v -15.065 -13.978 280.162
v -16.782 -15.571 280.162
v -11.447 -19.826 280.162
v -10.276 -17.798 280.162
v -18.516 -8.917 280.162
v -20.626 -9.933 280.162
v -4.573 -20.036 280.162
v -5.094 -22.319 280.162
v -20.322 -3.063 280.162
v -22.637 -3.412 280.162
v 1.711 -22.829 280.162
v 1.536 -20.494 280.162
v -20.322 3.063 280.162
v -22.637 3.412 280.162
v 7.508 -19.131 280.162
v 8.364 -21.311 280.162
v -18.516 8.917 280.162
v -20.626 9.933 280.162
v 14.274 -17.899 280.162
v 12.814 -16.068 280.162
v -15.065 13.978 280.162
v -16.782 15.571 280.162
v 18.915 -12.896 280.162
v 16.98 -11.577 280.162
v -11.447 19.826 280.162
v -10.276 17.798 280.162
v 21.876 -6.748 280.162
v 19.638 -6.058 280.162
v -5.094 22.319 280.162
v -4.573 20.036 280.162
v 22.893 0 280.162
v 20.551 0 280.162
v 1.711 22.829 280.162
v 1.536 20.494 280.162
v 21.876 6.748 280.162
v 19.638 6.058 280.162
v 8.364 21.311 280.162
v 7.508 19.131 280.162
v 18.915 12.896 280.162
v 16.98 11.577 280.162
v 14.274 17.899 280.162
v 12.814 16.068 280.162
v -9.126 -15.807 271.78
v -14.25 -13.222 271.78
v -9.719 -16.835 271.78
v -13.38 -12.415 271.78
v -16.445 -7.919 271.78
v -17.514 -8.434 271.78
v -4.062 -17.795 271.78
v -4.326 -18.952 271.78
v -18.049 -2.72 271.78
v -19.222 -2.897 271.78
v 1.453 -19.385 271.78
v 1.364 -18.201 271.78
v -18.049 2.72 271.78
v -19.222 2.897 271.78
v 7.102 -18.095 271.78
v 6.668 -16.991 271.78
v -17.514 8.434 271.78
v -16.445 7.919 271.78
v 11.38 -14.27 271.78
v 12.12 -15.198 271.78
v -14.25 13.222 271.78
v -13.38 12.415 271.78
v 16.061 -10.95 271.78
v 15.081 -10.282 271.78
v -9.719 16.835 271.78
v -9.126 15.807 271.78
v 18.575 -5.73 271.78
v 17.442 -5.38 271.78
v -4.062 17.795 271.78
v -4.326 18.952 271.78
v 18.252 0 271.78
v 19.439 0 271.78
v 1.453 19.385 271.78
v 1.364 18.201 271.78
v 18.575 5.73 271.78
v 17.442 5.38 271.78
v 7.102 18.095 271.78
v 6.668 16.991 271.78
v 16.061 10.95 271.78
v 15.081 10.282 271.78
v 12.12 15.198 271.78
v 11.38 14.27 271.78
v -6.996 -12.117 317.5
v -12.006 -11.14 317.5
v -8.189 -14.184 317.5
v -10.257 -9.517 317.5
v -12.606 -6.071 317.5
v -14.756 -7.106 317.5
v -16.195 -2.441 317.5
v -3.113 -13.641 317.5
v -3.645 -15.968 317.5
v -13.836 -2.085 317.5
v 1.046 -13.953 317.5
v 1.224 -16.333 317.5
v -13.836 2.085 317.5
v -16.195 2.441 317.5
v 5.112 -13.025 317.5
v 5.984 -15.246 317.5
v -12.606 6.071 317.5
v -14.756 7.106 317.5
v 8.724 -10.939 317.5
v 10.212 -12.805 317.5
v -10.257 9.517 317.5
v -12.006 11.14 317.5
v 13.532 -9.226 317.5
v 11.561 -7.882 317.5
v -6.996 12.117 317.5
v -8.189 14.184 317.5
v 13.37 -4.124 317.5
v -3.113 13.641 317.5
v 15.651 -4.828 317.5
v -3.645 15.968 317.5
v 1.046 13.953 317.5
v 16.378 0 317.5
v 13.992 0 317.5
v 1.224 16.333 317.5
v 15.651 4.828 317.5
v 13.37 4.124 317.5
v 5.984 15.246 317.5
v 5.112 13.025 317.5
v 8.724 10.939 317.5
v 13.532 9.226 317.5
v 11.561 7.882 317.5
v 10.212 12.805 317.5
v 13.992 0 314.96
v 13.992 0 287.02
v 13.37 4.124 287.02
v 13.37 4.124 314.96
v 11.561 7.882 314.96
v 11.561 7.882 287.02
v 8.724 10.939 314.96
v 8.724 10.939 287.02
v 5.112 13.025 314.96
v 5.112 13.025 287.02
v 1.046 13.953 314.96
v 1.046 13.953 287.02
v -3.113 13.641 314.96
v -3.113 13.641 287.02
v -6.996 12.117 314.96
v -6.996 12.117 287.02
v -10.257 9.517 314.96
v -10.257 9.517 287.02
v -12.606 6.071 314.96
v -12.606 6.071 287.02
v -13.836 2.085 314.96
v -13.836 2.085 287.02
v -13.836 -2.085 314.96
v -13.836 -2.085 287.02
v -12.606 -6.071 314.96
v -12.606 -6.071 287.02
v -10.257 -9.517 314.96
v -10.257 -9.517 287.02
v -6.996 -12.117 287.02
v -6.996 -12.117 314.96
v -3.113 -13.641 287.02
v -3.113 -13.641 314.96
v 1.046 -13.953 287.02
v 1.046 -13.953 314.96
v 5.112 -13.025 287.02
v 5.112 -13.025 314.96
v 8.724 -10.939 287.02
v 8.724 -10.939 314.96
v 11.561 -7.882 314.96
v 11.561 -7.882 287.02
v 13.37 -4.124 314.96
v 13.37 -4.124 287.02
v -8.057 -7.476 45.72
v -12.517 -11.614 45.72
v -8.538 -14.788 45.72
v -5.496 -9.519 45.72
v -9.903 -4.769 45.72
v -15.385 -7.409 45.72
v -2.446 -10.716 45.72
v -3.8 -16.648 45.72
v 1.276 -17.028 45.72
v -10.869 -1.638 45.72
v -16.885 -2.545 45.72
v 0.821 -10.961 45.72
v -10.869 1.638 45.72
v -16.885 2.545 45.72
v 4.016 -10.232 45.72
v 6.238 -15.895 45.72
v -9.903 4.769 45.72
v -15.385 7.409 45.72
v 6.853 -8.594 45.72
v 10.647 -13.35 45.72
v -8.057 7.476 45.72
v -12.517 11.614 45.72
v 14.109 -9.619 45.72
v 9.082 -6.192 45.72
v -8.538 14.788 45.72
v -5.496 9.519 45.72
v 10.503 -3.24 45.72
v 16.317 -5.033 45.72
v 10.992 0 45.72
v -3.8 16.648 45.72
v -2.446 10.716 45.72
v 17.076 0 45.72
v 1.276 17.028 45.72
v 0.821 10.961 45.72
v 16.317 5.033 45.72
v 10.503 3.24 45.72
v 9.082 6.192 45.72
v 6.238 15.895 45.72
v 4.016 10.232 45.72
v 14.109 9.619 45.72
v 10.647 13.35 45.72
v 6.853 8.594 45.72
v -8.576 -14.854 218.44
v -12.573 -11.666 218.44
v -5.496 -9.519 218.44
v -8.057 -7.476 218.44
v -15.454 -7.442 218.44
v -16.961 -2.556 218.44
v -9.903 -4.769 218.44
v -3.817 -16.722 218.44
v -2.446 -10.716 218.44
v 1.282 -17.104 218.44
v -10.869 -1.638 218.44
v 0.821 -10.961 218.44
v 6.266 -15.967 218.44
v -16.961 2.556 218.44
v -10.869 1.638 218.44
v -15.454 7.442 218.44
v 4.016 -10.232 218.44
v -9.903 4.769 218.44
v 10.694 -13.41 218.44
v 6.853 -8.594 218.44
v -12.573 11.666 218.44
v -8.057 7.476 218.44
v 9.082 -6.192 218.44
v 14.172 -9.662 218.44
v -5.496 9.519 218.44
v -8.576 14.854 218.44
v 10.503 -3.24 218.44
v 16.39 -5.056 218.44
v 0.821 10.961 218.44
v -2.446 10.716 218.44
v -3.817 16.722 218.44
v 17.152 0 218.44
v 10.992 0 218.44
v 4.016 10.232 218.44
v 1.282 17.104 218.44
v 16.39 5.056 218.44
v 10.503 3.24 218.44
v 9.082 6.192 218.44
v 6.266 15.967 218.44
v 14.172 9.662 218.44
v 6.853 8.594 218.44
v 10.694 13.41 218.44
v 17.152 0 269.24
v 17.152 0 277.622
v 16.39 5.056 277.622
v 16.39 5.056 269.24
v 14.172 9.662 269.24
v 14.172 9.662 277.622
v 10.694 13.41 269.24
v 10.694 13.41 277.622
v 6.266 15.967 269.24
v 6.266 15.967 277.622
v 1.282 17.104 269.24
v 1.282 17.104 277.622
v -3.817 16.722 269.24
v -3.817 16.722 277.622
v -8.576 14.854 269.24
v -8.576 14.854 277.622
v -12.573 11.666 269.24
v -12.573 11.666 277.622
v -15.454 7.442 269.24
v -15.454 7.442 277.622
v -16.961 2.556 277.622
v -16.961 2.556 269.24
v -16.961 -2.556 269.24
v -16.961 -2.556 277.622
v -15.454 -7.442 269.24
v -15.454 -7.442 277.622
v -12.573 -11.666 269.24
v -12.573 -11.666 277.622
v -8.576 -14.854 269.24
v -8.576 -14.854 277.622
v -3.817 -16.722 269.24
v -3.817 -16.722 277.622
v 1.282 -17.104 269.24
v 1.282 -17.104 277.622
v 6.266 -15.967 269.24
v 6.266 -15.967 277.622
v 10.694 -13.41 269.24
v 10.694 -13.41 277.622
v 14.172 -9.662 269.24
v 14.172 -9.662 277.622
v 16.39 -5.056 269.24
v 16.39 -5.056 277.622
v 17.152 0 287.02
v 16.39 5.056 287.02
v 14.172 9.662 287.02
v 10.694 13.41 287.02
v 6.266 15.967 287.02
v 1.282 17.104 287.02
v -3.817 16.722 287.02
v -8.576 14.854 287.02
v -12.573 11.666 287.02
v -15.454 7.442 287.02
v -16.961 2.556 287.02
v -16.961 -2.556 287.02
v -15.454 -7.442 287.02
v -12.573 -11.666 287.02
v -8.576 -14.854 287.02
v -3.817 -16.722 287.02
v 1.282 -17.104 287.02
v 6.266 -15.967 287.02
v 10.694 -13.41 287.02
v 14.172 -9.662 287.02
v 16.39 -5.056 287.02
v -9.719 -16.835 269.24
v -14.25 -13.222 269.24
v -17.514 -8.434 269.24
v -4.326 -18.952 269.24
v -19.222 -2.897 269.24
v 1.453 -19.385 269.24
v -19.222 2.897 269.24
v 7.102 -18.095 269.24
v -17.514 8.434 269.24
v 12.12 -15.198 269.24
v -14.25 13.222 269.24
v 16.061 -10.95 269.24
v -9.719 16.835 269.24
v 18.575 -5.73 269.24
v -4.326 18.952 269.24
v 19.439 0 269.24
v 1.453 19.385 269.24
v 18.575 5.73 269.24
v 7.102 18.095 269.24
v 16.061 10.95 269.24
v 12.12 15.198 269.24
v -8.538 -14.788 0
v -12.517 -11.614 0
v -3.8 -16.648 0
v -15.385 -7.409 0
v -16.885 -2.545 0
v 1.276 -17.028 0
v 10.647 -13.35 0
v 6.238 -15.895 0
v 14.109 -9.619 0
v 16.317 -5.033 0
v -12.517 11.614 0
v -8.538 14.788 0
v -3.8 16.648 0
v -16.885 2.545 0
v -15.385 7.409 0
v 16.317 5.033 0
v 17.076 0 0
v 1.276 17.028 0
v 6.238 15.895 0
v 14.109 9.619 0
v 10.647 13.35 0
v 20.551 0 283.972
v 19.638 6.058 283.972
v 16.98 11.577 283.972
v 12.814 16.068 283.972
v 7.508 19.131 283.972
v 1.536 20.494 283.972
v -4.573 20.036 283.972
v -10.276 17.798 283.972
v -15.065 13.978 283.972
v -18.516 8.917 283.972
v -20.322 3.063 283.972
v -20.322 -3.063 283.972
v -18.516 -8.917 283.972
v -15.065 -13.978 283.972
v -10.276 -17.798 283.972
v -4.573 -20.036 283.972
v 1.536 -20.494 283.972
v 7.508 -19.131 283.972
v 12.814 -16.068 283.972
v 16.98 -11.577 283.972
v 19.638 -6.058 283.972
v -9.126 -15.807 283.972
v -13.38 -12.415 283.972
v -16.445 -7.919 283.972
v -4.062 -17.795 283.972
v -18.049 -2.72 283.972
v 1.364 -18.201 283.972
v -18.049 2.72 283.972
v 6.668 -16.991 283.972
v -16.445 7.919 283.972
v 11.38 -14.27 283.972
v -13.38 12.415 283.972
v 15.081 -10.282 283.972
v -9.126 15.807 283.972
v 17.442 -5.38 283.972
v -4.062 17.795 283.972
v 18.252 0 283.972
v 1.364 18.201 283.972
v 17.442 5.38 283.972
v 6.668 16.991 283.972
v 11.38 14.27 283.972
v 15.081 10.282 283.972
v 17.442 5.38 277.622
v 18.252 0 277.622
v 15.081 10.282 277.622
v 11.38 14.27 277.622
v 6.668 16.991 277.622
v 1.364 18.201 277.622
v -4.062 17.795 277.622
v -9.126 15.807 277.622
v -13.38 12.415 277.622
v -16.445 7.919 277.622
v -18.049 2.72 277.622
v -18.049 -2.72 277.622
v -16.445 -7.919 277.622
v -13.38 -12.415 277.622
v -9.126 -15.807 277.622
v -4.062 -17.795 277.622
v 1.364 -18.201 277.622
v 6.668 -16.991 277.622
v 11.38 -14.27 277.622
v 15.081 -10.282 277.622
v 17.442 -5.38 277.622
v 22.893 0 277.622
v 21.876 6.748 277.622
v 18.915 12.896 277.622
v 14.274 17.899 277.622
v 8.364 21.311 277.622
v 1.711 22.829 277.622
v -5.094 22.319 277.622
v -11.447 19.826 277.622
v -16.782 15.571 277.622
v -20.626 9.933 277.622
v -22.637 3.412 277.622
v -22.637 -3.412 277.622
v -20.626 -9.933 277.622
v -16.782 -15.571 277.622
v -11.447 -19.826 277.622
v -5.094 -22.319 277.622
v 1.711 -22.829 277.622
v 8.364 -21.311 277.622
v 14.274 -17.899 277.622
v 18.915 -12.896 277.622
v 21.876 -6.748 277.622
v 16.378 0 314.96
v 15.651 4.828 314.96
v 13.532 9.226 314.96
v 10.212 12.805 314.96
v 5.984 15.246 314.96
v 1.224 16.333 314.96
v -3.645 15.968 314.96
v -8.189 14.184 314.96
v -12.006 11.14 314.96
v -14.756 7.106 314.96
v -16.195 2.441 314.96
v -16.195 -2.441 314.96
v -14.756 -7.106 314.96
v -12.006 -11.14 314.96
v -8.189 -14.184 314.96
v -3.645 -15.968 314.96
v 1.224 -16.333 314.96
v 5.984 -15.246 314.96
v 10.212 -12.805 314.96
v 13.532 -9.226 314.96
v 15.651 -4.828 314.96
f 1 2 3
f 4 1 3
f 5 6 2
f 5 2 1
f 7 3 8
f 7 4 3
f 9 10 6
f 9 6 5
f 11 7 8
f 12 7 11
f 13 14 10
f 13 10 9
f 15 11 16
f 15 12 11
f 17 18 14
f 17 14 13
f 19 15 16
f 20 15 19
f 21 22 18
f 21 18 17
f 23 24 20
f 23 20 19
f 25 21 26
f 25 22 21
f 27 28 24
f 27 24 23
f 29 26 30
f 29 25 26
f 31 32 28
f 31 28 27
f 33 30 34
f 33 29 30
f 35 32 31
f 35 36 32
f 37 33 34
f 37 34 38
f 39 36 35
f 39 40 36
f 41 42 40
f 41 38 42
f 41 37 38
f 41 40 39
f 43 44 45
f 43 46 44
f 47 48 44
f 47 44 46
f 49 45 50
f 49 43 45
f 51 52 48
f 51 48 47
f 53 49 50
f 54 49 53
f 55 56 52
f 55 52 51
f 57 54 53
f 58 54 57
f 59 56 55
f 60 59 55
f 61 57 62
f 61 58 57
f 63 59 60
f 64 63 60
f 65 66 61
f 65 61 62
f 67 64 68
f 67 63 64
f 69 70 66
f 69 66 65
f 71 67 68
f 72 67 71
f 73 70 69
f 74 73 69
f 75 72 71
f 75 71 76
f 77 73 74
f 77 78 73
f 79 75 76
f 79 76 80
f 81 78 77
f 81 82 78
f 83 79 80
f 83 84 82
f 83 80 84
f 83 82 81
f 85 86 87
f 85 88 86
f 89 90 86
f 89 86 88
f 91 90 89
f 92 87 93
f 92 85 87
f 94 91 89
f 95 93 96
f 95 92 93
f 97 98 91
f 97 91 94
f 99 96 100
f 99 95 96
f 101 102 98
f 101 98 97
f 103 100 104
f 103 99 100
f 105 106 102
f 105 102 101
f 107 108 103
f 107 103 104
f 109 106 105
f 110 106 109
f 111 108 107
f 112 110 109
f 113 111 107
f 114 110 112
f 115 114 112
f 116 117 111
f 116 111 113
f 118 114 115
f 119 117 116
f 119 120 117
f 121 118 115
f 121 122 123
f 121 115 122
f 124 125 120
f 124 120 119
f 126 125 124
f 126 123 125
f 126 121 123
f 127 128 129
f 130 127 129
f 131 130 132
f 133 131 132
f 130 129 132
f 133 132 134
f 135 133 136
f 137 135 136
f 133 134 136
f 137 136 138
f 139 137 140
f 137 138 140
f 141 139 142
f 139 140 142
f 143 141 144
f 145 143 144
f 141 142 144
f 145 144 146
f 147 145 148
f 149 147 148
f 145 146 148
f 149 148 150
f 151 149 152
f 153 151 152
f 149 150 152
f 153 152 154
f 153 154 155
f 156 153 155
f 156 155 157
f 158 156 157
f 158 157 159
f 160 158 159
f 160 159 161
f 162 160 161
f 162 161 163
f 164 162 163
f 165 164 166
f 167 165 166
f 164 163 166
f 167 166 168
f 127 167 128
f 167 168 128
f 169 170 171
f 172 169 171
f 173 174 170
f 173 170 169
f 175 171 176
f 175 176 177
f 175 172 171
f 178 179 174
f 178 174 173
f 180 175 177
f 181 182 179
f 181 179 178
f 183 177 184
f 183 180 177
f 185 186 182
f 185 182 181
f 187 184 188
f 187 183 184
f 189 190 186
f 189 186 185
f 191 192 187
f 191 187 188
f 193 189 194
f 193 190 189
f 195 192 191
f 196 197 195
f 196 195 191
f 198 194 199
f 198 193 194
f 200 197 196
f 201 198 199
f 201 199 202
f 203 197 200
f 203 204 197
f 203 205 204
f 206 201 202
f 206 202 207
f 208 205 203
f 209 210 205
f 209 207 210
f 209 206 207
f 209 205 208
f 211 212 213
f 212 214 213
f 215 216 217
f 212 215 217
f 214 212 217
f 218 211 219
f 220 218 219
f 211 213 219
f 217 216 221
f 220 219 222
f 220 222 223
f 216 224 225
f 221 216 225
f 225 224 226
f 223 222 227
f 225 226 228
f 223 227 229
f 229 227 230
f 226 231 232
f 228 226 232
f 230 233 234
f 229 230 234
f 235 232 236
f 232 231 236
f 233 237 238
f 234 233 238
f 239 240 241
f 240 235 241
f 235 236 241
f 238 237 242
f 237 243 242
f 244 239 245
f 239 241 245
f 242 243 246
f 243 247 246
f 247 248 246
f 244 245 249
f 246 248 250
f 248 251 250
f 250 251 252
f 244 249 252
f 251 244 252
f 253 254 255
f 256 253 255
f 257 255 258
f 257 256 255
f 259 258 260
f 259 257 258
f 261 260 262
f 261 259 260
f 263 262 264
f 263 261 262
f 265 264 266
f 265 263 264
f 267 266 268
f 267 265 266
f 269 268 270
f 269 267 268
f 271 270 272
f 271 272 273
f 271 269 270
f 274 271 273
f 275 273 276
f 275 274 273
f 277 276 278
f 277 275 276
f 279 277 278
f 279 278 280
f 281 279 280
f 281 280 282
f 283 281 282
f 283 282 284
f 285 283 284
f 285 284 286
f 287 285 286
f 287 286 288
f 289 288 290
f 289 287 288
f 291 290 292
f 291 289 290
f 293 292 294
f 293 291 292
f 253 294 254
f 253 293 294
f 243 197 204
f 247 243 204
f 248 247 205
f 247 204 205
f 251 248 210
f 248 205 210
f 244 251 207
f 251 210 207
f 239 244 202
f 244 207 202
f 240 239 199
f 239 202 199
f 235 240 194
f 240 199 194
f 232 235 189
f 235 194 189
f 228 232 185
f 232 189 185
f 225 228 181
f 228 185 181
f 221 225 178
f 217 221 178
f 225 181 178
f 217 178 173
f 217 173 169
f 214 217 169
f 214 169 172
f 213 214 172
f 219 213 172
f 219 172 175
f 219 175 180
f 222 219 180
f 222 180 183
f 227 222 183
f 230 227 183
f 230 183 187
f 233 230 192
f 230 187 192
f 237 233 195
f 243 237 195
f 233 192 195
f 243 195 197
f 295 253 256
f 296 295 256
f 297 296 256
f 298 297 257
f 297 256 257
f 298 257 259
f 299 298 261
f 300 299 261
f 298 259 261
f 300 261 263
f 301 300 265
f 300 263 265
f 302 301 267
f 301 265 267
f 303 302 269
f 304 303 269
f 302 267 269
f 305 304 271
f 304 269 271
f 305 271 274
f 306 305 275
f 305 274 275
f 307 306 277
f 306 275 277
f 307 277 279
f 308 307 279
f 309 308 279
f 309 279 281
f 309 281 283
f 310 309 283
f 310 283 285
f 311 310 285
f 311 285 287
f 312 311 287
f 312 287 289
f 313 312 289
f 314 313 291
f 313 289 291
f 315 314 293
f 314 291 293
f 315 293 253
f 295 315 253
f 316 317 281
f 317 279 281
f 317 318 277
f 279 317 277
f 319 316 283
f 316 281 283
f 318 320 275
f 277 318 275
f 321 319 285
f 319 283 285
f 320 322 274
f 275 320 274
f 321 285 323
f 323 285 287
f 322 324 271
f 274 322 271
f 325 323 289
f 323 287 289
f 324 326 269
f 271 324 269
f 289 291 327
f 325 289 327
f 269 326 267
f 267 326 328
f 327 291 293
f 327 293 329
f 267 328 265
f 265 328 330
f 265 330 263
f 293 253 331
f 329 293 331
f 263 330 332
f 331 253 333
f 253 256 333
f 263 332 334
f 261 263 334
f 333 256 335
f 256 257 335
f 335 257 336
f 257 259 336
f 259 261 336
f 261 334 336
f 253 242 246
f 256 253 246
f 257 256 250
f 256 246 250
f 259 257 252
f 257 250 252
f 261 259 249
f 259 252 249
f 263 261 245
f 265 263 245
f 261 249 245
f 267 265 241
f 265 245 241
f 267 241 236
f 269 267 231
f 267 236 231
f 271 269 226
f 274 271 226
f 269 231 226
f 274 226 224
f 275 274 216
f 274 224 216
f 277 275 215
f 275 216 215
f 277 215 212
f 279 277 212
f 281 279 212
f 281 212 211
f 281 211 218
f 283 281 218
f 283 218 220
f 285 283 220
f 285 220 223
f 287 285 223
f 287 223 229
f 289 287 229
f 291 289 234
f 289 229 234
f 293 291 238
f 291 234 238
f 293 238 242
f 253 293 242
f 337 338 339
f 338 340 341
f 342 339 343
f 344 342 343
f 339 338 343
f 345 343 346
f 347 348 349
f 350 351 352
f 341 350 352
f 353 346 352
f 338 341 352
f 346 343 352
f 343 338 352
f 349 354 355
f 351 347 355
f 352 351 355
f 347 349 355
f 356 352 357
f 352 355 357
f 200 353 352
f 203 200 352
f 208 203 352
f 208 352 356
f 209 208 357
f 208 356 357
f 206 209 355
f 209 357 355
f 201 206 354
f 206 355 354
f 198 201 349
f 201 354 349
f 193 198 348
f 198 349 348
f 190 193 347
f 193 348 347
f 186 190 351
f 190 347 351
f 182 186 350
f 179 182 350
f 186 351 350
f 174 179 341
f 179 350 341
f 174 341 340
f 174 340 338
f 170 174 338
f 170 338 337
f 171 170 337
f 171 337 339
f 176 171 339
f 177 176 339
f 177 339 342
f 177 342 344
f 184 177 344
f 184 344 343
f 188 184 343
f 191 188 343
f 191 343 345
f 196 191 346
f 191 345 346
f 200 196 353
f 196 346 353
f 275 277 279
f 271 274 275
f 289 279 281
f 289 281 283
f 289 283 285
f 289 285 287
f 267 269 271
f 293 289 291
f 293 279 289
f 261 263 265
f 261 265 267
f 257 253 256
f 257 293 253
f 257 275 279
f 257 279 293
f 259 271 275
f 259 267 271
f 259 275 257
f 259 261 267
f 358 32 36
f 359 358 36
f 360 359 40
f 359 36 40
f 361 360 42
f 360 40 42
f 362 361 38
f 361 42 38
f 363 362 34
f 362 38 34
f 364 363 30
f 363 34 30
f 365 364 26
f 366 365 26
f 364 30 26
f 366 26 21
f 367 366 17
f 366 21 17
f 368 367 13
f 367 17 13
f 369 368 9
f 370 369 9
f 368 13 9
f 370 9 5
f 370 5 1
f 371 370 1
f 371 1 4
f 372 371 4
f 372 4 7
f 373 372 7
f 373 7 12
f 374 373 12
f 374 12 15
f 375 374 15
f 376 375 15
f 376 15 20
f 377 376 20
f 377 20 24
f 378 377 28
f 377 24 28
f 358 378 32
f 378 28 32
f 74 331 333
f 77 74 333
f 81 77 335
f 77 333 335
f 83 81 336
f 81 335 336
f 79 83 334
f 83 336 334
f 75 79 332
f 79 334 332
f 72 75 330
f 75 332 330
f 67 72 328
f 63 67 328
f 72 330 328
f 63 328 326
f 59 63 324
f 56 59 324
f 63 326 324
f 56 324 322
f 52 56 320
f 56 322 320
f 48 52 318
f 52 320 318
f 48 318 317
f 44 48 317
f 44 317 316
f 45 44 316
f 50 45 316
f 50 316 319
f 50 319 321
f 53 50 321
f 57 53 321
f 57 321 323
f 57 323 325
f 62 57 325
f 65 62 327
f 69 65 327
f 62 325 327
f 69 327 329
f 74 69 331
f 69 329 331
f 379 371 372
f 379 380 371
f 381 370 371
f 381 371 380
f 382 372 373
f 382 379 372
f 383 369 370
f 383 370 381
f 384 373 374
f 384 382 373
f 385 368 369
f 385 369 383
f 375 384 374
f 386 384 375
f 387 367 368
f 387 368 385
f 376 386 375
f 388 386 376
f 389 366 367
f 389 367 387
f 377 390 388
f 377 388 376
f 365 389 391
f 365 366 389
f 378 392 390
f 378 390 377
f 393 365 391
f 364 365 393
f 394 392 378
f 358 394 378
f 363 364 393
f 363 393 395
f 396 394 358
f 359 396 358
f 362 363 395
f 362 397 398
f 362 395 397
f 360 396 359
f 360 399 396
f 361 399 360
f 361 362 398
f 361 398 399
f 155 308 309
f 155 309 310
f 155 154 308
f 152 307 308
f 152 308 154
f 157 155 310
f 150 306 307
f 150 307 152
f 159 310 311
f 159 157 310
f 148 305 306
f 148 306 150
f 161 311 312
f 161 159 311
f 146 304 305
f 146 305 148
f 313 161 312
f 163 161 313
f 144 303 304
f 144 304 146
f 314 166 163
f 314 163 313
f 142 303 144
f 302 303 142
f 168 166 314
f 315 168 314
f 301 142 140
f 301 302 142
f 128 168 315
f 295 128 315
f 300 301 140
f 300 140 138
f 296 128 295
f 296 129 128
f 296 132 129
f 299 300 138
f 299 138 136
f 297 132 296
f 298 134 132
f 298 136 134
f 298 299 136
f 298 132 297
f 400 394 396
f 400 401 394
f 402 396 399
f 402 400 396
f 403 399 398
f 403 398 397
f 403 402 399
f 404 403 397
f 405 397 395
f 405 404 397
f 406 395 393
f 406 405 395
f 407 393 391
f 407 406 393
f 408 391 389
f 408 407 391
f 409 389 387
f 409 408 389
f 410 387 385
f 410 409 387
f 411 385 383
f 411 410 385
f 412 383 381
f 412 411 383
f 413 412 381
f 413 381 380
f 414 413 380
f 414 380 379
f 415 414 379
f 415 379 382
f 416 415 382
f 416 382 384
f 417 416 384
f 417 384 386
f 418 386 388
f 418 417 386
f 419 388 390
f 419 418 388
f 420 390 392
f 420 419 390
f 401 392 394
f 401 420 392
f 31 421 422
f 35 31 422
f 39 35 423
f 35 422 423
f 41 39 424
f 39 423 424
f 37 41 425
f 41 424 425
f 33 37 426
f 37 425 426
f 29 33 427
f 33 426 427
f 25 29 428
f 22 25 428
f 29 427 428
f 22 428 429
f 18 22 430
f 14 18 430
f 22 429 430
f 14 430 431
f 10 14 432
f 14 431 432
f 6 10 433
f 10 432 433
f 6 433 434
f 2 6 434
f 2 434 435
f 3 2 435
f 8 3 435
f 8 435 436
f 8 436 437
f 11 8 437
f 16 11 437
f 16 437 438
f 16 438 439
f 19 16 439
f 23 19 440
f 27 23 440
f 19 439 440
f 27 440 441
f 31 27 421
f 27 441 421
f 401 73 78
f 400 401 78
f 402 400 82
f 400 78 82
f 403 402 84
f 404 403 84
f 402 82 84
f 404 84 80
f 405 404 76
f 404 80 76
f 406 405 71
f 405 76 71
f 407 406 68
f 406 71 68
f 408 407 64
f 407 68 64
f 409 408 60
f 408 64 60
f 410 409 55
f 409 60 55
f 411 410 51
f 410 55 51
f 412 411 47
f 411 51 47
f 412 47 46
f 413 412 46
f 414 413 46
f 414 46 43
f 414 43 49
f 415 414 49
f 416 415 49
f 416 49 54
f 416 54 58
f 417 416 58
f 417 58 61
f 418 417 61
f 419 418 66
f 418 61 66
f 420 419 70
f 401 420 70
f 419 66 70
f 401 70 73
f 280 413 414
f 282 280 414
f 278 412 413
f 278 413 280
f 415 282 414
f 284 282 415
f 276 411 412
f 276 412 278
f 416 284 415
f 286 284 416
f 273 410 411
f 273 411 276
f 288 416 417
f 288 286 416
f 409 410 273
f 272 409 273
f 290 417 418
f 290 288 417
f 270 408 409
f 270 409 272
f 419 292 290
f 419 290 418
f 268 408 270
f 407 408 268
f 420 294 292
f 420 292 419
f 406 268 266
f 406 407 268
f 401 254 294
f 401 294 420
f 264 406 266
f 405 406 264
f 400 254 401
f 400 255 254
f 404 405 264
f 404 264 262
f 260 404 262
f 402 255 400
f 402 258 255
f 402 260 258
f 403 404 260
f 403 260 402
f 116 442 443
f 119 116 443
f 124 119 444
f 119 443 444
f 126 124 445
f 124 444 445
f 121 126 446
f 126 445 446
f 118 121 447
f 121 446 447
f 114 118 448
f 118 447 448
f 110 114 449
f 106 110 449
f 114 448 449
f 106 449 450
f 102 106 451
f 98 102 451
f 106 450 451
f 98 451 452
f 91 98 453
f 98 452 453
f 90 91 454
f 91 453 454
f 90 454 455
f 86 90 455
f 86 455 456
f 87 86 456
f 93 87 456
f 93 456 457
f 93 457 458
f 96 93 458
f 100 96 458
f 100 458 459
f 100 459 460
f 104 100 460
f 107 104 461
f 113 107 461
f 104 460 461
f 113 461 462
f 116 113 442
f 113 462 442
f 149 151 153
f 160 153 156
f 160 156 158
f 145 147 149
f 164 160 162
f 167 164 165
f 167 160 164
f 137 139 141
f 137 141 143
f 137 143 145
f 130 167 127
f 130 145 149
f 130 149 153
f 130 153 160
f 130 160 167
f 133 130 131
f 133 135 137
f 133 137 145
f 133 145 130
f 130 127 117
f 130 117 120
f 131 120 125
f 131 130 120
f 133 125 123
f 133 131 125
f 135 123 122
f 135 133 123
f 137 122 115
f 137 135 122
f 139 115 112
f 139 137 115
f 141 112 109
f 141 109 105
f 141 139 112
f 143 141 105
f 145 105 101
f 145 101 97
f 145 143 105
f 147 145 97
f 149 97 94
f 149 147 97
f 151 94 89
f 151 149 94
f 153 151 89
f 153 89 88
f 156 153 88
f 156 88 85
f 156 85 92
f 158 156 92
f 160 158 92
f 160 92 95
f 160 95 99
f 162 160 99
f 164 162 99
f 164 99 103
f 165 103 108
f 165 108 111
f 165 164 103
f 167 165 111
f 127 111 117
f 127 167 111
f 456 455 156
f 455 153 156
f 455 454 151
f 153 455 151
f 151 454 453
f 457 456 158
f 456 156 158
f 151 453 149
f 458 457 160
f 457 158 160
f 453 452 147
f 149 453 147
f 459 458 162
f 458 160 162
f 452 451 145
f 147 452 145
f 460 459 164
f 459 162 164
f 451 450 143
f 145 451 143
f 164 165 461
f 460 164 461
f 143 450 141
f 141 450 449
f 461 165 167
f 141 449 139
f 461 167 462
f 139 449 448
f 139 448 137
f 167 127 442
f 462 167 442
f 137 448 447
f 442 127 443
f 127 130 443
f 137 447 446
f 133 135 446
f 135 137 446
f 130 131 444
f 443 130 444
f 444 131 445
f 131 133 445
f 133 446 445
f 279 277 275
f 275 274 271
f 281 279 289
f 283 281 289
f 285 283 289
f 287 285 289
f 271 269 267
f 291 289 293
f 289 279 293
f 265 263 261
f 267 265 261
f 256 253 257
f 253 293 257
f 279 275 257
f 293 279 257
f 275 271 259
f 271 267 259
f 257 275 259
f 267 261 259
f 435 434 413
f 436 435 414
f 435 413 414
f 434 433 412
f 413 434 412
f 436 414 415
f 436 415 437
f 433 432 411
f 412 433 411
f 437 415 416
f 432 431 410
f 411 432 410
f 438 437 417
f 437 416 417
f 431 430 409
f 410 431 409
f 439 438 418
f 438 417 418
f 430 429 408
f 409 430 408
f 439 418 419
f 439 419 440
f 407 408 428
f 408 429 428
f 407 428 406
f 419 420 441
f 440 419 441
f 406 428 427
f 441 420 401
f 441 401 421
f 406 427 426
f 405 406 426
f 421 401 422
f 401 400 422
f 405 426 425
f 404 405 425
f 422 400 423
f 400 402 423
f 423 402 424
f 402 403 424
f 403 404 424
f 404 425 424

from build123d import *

# Parameters (mm, degrees)
F0_R      = 17.0757771847
F1_DEPTH  = 45.72
F2_R      = 10.9916576932
F3_DEPTH  = 172.72
F5_R      = 17.1521725586
F6_DEPTH  = 50.8
F7_R      = 19.4388820388
F7_R_2    = 17.1521725586
F8_DEPTH  = 2.54
F9_R      = 18.252412193
F9_R_2    = 17.1521725586
F10_DEPTH = 5.842
F11_R     = 22.8931655333
F11_R_2   = 18.252412193
F12_DEPTH = 2.54
F13_R     = 20.551318228
F13_R_2   = 18.252412193
F14_DEPTH = 3.81
F15_DEPTH = 17.78
F17_R     = 13.9919168475
F18_DEPTH = 27.94
F19_R     = 16.3783467145
F19_R_2   = 13.9919168475
F20_DEPTH = 2.54


with BuildPart() as f1:
    # F0 (on Top) → F1 (new body)
    with BuildSketch(Plane.XY):
        Circle(F0_R)
    extrude(amount=F1_DEPTH)

    # F2 (on face) → F3 (join)
    with BuildSketch(Plane.XY.offset(45.72)):
        Circle(F2_R)
    extrude(amount=F3_DEPTH)

    # F5 (on offset) → F6 (join)
    with BuildSketch(Plane.XY.offset(218.44)):
        Circle(F5_R)
    extrude(amount=F6_DEPTH)


with BuildPart() as f8:
    # F7 (on face) → F8 (new body)
    with BuildSketch(Plane.XY.offset(269.24)):
        Circle(F7_R)
        Circle(F7_R_2, mode=Mode.SUBTRACT)
    extrude(amount=F8_DEPTH)

    # F9 (on face) → F10 (join)
    with BuildSketch(Plane.XY.offset(271.78)):
        Circle(F9_R)
        Circle(F9_R_2, mode=Mode.SUBTRACT)
    extrude(amount=F10_DEPTH)


with BuildPart() as f12:
    # F11 (on face) → F12 (new body)
    with BuildSketch(Plane.XY.offset(277.622)):
        Circle(F11_R)
        Circle(F11_R_2, mode=Mode.SUBTRACT)
    extrude(amount=F12_DEPTH)

    # F13 (on face) → F14 (join)
    with BuildSketch(Plane.XY.offset(280.162)):
        Circle(F13_R)
        Circle(F13_R_2, mode=Mode.SUBTRACT)
    extrude(amount=F14_DEPTH)


with BuildPart() as f15:
    # F15 (new): a face of the model
    f15_faces = [f1.part.faces().sort_by_distance(p)[0] for p in [
        (0, 0, 269.24),
    ]]
    extrude(f15_faces, amount=F15_DEPTH)

    # F17 (on face) → F18 (join)
    with BuildSketch(Plane.XY.offset(287.02)):
        Circle(F17_R)
    extrude(amount=F18_DEPTH)


with BuildPart() as f20:
    # F19 (on face) → F20 (new body)
    with BuildSketch(Plane.XY.offset(314.96)):
        Circle(F19_R)
        Circle(F19_R_2, mode=Mode.SUBTRACT)
    extrude(amount=F20_DEPTH)


solid = Compound([f1.part, f8.part, f12.part, f15.part, f20.part])
